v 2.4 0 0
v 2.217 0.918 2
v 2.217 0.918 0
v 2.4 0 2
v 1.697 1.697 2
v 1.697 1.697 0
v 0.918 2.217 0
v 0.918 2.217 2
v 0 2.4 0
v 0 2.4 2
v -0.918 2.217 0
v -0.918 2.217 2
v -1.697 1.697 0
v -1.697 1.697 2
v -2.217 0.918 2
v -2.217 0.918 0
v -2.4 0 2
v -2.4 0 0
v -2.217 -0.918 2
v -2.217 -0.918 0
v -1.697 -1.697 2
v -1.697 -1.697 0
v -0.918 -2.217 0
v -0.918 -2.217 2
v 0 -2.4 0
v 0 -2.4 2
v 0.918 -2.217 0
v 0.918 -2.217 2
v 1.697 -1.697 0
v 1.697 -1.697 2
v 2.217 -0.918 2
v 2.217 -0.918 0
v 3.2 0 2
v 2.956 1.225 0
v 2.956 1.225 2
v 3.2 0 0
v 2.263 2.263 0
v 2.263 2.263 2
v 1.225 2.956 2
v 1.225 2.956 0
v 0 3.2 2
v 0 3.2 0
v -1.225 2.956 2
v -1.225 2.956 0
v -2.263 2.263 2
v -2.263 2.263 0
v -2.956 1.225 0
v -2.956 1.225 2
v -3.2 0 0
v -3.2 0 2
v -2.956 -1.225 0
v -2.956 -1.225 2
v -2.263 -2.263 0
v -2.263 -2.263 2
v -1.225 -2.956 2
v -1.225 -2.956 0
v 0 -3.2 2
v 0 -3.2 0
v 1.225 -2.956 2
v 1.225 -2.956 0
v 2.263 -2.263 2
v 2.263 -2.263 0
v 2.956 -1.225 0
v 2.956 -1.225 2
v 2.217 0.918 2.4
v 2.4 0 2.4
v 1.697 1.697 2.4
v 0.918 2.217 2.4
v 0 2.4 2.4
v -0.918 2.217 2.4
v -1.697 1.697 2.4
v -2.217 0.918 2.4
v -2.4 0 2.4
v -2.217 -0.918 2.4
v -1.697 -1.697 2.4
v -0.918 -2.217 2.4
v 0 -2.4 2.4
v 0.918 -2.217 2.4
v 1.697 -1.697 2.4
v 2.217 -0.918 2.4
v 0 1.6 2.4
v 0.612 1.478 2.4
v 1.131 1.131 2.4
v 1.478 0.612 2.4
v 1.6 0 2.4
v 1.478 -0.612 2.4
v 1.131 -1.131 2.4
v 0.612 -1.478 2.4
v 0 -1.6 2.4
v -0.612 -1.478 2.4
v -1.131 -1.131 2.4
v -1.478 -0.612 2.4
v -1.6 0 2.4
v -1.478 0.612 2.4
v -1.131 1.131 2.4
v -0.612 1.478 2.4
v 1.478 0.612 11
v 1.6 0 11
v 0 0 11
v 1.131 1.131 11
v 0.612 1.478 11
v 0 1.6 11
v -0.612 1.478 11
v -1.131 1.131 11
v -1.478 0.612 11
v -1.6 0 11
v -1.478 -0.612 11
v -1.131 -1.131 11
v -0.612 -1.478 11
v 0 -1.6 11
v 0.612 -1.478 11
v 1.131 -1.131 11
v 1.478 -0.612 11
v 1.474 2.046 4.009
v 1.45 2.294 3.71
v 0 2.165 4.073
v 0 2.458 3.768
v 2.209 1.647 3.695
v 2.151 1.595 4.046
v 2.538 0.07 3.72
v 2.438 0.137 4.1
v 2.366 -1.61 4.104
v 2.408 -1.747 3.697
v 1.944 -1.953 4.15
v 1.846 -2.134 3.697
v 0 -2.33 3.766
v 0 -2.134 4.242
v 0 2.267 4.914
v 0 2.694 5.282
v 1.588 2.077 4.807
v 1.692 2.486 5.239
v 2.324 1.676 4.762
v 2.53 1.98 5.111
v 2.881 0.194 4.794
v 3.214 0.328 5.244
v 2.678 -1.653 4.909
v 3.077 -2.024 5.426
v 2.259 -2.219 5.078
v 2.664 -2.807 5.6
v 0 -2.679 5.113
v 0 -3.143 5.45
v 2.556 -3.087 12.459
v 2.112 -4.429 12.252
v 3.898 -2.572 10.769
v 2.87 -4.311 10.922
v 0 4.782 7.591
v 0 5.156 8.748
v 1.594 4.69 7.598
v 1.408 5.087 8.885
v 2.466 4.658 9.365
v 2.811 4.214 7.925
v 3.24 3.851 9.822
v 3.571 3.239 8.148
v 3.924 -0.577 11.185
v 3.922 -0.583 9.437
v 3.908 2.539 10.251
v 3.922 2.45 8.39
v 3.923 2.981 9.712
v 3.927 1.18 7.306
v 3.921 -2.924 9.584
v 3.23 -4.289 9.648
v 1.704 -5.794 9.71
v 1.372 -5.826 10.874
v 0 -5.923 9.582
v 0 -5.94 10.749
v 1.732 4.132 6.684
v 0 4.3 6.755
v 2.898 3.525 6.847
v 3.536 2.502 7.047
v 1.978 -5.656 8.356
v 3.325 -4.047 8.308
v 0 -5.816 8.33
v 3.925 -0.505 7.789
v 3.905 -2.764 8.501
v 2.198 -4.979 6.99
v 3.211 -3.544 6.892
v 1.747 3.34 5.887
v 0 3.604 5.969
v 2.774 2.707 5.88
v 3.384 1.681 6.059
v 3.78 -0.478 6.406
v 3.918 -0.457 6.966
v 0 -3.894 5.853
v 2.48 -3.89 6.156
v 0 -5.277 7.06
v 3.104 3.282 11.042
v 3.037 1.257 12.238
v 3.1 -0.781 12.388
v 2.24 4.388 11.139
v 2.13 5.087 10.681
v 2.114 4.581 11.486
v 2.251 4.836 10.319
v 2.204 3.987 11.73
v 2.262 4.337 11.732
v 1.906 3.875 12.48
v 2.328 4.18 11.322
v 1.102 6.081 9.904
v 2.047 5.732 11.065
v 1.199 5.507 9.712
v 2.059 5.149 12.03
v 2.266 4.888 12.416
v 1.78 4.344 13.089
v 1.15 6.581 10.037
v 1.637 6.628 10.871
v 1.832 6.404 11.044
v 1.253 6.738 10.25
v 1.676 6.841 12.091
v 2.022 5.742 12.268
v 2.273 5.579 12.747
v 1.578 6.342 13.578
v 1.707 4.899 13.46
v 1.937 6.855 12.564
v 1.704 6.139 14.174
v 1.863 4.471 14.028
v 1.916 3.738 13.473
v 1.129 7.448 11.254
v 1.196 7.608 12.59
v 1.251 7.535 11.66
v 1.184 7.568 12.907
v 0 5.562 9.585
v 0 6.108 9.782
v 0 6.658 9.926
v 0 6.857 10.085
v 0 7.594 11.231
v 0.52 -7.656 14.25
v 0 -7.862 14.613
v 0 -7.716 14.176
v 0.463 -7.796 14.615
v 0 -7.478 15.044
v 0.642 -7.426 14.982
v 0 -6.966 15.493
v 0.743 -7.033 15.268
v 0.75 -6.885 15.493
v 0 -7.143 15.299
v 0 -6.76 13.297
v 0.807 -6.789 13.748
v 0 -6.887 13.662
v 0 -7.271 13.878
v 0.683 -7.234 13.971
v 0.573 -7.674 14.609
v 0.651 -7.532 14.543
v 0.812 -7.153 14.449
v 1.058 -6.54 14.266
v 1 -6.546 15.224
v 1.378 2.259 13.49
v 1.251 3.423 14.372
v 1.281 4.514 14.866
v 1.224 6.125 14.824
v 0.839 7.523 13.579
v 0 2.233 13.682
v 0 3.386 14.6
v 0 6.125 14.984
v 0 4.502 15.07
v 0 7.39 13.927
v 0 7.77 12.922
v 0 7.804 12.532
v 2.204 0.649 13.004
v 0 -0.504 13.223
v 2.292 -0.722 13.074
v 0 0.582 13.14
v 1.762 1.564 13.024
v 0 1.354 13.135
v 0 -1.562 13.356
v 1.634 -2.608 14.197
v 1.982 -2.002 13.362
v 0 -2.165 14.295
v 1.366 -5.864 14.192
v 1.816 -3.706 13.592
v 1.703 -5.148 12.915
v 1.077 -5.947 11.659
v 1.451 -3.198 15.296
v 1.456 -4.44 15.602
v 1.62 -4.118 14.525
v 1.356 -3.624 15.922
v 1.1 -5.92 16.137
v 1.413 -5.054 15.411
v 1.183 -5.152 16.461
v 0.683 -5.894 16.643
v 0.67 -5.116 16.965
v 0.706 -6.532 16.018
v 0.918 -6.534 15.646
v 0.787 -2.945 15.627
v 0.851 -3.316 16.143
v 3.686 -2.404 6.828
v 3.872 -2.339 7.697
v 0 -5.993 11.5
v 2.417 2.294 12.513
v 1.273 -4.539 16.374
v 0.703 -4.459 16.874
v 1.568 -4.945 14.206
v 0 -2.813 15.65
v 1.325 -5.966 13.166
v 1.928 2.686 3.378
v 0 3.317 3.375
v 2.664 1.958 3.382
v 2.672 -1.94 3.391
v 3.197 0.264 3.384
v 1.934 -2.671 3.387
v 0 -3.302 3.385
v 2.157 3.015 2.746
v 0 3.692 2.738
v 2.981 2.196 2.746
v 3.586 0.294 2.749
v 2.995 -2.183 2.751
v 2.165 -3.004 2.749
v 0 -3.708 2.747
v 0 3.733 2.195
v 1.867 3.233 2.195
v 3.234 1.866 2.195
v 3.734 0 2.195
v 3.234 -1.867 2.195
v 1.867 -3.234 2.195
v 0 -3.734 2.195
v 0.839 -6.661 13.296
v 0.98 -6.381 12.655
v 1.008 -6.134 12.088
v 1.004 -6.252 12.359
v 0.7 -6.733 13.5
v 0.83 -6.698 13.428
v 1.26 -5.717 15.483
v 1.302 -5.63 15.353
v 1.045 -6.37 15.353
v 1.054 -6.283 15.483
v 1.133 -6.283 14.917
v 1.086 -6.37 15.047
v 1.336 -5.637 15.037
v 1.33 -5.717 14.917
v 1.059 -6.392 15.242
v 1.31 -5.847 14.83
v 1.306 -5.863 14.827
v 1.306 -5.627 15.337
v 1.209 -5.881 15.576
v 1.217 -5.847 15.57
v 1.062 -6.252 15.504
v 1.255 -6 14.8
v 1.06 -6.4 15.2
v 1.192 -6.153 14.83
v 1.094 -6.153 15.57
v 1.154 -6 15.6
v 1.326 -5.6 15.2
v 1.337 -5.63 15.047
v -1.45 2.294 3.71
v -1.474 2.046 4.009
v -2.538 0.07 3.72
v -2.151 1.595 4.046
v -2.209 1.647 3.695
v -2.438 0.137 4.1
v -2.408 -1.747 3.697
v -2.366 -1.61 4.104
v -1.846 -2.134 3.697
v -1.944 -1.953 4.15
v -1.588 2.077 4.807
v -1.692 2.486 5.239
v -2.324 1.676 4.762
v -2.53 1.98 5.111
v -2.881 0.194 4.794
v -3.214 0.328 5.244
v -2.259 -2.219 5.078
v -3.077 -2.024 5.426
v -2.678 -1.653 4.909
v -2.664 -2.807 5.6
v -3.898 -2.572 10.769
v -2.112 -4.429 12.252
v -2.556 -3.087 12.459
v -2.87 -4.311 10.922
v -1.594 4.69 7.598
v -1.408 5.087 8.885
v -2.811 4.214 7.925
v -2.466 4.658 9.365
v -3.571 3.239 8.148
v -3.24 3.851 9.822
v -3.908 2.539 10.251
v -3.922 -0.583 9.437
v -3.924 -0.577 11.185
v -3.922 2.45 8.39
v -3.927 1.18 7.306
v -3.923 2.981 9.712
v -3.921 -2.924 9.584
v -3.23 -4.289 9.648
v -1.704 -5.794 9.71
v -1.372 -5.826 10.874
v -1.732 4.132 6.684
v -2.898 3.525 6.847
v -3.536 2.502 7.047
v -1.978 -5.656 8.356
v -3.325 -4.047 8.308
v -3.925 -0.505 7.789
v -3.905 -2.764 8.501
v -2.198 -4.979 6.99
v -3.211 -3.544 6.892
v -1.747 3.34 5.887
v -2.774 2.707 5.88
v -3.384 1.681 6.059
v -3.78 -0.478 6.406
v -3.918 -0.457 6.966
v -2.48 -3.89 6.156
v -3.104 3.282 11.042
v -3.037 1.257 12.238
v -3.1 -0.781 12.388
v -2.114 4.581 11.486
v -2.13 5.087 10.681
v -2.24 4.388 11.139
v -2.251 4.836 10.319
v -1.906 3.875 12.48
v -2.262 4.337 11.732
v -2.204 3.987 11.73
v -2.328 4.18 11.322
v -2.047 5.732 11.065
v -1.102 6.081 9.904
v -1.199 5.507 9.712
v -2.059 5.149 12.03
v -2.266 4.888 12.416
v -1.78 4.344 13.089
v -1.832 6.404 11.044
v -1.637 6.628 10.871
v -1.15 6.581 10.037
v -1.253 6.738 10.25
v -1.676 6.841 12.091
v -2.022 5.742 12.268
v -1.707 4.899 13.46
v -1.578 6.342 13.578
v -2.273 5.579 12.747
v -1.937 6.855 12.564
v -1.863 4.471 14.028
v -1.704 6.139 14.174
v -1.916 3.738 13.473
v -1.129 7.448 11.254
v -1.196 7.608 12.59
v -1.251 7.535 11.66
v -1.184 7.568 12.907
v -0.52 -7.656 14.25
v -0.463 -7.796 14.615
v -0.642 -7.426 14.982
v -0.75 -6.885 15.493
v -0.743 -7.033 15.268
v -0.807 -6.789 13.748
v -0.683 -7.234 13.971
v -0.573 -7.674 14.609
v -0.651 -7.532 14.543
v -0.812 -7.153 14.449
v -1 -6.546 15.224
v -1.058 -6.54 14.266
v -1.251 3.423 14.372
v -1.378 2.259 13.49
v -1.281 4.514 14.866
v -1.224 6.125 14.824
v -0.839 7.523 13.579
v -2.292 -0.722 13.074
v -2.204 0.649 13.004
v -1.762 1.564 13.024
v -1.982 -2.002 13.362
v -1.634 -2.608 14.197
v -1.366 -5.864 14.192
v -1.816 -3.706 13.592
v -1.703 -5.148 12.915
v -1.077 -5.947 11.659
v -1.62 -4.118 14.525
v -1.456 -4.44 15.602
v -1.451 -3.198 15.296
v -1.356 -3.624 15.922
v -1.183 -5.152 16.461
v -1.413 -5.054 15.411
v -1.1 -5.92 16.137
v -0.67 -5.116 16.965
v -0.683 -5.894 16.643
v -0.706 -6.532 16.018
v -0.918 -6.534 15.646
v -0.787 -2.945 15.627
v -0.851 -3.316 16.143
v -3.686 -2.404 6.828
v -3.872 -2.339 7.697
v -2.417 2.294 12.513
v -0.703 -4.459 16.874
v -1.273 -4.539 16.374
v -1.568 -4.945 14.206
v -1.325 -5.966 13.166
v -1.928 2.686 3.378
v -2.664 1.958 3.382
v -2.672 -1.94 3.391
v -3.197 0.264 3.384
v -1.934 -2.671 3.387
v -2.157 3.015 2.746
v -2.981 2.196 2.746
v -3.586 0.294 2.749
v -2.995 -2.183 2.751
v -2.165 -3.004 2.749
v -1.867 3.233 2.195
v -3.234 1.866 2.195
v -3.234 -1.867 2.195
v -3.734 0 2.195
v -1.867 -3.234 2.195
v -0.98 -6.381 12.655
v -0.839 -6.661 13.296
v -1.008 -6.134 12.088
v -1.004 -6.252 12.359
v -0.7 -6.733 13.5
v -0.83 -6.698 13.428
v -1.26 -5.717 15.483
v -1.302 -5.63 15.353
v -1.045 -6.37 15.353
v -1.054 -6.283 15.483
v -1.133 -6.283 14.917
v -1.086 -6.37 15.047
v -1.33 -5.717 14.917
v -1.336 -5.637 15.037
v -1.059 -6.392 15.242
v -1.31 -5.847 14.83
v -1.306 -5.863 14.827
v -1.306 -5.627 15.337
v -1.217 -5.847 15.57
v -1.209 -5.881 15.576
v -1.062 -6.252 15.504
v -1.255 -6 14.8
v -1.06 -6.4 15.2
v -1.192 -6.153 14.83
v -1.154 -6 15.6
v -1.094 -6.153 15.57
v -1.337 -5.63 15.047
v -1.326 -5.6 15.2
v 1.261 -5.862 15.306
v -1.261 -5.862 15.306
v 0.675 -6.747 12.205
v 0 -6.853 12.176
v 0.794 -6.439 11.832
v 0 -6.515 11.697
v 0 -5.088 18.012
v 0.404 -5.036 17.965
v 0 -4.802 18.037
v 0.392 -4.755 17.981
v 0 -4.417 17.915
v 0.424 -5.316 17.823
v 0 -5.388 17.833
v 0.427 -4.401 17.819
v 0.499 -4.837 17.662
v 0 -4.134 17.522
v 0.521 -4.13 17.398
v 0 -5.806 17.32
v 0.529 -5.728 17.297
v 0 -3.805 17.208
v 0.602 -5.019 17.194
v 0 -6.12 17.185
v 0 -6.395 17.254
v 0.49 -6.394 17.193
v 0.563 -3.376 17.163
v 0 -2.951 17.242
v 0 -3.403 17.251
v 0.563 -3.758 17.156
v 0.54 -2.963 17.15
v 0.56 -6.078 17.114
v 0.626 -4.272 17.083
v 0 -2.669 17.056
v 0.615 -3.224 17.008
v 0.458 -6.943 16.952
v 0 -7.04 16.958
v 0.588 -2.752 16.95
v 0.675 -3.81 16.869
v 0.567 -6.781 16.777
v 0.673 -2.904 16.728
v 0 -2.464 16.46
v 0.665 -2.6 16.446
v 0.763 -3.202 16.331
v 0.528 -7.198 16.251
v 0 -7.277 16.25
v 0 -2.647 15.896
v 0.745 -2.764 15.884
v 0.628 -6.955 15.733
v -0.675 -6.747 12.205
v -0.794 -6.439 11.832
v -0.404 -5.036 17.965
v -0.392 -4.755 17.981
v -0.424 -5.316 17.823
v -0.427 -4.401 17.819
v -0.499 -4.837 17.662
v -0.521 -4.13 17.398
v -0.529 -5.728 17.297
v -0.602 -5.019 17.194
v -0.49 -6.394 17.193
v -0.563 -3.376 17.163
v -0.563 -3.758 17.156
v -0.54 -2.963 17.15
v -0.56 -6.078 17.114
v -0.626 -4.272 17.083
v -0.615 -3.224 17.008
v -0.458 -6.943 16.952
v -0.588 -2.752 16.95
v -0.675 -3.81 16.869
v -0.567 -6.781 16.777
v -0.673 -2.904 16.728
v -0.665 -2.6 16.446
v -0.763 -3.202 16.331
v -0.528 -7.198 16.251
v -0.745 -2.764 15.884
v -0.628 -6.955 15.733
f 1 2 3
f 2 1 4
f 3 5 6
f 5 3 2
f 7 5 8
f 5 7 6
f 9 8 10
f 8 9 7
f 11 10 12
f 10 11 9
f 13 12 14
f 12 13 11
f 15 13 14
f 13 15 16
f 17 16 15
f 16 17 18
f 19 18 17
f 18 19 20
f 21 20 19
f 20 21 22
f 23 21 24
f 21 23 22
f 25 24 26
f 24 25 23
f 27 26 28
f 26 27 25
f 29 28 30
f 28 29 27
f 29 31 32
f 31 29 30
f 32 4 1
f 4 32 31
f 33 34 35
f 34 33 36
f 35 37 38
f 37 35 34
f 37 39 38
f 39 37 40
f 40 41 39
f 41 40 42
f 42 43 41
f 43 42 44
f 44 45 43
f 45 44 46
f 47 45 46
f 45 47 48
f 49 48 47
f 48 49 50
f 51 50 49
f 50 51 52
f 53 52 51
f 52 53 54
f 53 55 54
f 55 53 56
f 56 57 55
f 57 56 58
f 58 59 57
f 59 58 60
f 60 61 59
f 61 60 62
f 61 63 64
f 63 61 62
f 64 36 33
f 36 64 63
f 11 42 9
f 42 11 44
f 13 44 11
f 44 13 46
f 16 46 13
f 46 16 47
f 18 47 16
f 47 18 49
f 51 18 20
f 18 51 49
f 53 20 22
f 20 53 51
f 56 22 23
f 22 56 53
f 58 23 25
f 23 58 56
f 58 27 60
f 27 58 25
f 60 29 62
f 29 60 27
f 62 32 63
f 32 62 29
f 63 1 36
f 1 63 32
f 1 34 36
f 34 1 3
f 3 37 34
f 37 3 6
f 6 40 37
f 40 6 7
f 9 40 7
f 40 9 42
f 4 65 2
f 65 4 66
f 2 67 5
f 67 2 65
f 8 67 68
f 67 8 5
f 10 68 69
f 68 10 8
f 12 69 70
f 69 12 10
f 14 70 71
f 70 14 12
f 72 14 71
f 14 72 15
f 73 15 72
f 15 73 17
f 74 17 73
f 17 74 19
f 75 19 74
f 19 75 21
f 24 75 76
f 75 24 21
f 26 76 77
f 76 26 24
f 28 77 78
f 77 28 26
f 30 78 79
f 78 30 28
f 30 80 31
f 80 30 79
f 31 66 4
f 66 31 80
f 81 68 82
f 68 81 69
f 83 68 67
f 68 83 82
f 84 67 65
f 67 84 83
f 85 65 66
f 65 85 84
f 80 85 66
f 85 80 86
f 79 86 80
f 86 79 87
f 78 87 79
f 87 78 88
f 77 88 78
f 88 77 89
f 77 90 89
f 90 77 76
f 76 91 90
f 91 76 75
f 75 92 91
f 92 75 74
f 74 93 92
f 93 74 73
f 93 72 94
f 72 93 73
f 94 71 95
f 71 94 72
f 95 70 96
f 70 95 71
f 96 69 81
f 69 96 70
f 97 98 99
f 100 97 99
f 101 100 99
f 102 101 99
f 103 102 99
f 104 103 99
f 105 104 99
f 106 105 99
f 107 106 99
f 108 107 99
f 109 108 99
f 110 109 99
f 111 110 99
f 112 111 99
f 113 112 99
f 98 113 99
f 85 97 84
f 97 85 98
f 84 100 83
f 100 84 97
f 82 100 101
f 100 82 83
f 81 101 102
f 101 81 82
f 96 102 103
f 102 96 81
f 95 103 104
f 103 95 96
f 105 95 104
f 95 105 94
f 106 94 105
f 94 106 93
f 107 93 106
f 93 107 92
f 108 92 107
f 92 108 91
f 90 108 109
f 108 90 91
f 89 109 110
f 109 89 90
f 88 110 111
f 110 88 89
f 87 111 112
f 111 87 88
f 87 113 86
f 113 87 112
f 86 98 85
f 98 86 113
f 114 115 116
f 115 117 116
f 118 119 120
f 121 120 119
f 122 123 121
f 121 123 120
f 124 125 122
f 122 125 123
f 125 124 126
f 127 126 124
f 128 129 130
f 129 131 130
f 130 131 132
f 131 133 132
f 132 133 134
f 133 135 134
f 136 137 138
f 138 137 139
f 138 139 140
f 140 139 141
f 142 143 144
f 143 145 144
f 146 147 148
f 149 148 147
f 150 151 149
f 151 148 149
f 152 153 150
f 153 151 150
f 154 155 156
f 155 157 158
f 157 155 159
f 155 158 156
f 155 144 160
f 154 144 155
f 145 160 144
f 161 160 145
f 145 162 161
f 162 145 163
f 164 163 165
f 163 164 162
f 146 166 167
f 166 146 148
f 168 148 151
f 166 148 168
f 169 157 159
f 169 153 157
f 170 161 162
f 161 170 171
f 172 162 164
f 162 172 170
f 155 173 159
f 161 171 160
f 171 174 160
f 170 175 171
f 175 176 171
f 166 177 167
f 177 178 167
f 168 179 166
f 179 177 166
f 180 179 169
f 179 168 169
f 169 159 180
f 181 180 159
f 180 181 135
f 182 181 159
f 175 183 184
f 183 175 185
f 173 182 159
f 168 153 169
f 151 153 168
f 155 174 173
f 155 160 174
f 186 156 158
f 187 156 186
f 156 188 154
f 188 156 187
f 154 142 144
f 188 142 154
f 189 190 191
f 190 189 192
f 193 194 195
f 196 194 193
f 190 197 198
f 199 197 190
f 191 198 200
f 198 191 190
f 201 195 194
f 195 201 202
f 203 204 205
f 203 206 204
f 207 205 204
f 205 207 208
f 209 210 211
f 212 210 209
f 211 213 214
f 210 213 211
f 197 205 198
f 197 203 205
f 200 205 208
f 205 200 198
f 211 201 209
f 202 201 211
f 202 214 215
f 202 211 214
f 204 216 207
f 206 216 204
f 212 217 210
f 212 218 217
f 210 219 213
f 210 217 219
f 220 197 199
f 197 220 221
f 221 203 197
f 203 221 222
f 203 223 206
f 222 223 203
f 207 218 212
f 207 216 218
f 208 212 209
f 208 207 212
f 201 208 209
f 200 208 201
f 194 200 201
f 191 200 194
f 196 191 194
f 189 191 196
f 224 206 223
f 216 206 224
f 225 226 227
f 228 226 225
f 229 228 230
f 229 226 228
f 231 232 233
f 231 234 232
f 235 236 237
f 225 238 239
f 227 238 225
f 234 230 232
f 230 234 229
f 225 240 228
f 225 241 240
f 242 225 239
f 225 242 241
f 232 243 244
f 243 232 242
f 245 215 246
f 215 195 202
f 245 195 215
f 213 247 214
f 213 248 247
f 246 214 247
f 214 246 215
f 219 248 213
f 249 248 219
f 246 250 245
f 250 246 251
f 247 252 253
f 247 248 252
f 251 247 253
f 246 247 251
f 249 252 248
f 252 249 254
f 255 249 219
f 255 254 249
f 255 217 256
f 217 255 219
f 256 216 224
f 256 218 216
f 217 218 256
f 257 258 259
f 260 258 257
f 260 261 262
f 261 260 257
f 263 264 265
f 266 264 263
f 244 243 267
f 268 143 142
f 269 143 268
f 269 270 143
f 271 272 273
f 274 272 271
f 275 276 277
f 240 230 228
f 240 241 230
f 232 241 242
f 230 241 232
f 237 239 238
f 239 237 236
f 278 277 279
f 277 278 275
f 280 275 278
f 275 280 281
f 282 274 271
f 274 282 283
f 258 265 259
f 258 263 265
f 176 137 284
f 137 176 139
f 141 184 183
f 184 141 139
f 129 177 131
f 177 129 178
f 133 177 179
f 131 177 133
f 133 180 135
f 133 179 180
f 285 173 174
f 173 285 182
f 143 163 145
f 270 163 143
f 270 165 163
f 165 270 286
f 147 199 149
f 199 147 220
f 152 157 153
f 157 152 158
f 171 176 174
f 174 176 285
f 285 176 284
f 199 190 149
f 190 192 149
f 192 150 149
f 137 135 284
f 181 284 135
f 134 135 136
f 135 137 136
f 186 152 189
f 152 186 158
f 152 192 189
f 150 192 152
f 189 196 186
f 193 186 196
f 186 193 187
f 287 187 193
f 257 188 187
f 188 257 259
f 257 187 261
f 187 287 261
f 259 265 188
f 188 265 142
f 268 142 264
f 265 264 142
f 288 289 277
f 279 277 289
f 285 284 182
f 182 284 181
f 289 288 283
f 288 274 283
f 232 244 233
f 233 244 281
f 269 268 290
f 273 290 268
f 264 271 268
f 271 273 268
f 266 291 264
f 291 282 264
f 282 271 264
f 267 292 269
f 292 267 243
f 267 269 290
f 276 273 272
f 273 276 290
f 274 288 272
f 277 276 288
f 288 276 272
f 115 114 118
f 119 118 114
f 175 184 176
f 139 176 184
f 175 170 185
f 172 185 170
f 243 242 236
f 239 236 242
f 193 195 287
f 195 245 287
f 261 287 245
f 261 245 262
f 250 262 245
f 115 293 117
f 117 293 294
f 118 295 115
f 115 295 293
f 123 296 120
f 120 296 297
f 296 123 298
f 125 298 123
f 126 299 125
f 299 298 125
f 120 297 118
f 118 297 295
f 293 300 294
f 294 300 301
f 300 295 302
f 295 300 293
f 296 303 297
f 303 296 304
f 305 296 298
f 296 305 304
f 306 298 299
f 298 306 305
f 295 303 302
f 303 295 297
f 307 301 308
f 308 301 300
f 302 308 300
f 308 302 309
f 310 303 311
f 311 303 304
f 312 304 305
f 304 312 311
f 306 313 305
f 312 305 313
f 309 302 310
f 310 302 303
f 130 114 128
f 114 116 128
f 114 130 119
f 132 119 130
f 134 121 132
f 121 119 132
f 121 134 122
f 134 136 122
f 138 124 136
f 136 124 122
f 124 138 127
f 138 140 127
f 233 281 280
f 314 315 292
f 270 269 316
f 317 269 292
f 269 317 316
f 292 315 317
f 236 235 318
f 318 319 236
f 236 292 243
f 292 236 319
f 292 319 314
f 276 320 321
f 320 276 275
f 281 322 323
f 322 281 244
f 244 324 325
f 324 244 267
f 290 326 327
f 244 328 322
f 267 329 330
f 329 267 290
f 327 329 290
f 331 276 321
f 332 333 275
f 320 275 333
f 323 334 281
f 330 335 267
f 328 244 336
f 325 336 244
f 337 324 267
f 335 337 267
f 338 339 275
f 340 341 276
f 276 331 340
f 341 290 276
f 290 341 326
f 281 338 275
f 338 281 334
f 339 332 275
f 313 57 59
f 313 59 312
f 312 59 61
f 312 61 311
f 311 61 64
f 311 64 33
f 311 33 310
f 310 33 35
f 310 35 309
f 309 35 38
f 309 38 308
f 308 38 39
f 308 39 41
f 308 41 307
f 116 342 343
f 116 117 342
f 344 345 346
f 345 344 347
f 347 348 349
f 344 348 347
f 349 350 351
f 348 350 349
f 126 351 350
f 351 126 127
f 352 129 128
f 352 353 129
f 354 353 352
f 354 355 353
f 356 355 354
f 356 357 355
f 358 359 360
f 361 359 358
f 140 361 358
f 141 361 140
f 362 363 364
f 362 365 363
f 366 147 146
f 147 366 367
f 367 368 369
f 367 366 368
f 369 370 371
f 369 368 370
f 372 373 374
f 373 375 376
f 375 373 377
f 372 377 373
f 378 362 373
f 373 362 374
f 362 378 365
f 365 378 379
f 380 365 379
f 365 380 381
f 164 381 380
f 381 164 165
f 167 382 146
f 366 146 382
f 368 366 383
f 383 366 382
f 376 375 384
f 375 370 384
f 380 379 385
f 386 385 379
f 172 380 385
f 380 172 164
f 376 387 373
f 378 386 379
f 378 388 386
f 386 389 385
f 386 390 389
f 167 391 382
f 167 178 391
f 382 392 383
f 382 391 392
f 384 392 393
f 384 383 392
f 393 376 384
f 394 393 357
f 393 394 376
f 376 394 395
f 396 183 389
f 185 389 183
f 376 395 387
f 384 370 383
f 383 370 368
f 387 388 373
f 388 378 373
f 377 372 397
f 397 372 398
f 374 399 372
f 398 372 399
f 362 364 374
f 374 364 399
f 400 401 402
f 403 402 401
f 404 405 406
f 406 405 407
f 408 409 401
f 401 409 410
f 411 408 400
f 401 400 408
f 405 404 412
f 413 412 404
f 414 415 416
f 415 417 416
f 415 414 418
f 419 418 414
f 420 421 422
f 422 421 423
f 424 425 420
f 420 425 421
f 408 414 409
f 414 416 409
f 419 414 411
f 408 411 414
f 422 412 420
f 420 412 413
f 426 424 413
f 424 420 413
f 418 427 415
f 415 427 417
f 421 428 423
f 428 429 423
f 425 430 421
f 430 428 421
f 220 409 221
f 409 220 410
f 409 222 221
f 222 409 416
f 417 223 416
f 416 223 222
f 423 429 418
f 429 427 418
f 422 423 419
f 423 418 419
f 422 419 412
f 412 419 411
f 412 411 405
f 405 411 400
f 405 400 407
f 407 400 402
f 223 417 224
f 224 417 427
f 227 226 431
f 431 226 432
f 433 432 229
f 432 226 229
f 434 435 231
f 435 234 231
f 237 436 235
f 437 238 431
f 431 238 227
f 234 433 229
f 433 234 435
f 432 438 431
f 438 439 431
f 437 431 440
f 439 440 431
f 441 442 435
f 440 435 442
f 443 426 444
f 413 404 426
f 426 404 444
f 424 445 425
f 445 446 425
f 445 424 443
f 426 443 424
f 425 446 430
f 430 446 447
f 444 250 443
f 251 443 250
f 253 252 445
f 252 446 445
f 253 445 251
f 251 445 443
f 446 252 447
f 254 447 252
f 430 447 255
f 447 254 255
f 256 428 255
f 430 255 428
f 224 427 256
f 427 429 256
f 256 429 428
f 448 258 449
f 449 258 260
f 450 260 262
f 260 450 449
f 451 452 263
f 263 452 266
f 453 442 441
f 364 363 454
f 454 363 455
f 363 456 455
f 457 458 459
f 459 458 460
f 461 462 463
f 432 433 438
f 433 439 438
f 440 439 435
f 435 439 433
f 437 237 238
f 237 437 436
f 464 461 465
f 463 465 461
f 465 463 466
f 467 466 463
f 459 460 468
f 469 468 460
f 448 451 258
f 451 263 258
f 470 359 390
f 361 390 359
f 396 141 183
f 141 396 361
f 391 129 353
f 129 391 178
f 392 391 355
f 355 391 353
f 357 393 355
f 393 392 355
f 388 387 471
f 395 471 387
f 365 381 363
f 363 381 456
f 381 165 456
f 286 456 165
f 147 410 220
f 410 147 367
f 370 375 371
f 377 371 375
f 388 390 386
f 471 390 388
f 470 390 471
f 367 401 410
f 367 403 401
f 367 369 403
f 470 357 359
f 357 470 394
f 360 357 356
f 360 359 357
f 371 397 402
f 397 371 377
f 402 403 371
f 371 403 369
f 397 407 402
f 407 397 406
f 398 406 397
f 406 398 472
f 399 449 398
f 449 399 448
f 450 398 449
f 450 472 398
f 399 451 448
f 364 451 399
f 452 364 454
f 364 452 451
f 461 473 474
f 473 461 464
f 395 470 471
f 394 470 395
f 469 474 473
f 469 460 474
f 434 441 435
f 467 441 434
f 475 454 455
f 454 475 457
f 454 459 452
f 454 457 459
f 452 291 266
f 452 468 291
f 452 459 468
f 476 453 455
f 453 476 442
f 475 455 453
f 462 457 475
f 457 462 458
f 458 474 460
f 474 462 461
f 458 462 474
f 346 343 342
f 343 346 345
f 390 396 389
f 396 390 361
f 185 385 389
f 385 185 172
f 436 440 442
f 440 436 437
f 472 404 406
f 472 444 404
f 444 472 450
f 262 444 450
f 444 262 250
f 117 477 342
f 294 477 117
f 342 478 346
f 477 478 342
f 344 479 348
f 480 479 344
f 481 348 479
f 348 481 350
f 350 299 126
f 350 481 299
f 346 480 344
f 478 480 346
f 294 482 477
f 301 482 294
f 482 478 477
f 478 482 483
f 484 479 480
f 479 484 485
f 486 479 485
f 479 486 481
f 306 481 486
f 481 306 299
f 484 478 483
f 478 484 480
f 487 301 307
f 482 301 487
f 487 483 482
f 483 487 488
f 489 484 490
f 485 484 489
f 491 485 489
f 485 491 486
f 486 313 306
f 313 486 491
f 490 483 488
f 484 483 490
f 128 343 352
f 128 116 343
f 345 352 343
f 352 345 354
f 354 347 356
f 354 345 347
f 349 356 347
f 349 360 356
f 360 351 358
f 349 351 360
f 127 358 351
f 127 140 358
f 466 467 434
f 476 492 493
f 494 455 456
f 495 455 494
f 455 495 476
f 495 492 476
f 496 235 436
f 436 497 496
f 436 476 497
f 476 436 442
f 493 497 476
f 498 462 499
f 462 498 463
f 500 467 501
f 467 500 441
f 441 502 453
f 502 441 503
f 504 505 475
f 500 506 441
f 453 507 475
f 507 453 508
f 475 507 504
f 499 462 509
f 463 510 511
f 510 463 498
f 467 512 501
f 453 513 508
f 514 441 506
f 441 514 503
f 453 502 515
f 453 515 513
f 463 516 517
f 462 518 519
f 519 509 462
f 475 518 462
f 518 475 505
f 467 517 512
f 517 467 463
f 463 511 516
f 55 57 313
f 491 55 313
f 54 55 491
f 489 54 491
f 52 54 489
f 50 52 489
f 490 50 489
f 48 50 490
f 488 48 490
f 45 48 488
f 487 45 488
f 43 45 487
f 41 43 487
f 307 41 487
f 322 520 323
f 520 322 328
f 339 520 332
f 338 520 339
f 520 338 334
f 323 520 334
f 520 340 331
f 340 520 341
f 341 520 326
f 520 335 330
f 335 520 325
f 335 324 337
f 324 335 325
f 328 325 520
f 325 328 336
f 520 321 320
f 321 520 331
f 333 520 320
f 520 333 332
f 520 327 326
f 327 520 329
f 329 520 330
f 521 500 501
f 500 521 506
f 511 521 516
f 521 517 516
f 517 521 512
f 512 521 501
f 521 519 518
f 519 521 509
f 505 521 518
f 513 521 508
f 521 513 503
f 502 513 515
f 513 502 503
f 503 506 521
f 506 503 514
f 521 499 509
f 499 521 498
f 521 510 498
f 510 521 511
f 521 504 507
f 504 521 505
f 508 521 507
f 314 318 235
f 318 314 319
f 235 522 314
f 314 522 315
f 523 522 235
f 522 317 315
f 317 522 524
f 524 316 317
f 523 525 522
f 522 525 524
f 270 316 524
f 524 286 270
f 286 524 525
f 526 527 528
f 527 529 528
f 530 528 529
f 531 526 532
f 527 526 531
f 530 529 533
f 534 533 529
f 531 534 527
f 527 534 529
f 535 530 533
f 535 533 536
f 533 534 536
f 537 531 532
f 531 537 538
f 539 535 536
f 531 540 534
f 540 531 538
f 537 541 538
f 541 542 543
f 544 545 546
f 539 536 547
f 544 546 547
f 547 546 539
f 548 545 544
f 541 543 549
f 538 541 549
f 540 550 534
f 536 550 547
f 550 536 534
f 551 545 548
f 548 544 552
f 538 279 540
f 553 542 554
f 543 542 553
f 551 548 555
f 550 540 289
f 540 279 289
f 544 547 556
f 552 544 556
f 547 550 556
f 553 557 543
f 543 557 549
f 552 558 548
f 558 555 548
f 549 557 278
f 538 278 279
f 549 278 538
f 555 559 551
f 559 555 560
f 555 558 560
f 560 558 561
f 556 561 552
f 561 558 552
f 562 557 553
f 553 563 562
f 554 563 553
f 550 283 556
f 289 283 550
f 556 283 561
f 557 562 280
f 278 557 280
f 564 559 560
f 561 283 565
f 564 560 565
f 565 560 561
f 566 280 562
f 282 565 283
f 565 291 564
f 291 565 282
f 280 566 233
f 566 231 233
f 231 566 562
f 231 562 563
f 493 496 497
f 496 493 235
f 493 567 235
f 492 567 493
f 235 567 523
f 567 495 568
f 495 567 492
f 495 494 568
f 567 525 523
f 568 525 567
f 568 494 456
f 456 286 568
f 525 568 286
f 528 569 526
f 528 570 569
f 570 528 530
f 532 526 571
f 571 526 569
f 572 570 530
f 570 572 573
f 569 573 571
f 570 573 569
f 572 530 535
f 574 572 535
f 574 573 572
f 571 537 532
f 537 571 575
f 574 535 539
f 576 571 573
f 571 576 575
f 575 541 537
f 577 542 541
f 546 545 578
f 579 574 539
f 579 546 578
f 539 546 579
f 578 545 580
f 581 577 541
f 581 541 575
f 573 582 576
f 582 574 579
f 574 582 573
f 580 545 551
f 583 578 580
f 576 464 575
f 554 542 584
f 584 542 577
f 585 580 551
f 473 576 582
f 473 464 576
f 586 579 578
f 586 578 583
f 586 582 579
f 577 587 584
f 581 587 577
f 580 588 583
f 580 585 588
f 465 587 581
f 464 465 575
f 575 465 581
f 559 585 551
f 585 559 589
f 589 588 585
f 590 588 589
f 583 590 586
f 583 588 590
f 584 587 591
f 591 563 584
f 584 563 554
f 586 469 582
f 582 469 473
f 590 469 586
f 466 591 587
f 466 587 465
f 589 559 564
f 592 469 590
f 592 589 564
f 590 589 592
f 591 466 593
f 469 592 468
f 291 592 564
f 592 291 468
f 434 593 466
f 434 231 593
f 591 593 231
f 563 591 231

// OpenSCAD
use <../lib.scad>
use <../p/4-4cylc.scad>
use <../p/4-4cyli.scad>
use <../p/4-4edge.scad>
use <../p/4-4ring2.scad>
use <s/95342s01.scad>
use <s/95342s02.scad>
use <s/95342s03.scad>
use <../p/stud4a.scad>
function ldraw_lib__95342() = [
// 0 Animal Chicken
// 0 Name: 95342.dat
// 0 Author: Magnus Forsberg [MagFors]
// 0 !LDRAW_ORG Part UPDATE 2011-02
// 0 !LICENSE Licensed under CC BY 4.0 : see CAreadme.txt
// 
// 0 BFC CERTIFY CCW
  [0,"BFC","CERTIFY"],
  [0,"BFC","CCW"],
// 
// 0 !HISTORY 2011-09-08 {LEGO Digital Designer} Original part shape
// 0 !HISTORY 2011-09-10 [MagFors] File preparation for LDraw Parts Tracker
// 0 !HISTORY 2011-12-29 [PTadmin] Official Update 2011-02
// 
// 
// 1 16 0 -5 0 1 0 0 0 -1.25 0 0 0 1 stud4a.dat
  [1,16,0,-5,0,1,0,0,0,-1.25,0,0,0,1, ldraw_lib__stud4a()],
// 1 16 0 -6 0 6 0 0 0 1 0 0 0 6 4-4edge.dat
  [1,16,0,-6,0,6,0,0,0,1,0,0,0,6, ldraw_lib__4_4edge()],
// 0 BFC INVERTNEXT
  [0,"BFC","INVERTNEXT"],
// 1 16 0 -6 0 6 0 0 0 1 0 0 0 6 4-4cyli.dat
  [1,16,0,-6,0,6,0,0,0,1,0,0,0,6, ldraw_lib__4_4cyli()],
// 1 16 0 -6 0 -2 0 0 0 -1 0 0 0 2 4-4ring2.dat
  [1,16,0,-6,0,-2,0,0,0,-1,0,0,0,2, ldraw_lib__4_4ring2()],
// 0 BFC INVERTNEXT
  [0,"BFC","INVERTNEXT"],
// 1 16 0 -27.5 0 4 0 0 0 21.5 0 0 0 4 4-4cylc.dat
  [1,16,0,-27.5,0,4,0,0,0,21.5,0,0,0,4, ldraw_lib__4_4cylc()],
// 1 16 0 -5 0 8 0 0 0 1 0 0 0 8 4-4edge.dat
  [1,16,0,-5,0,8,0,0,0,1,0,0,0,8, ldraw_lib__4_4edge()],
// 1 16 0 0 0 1 0 0 0 1 0 0 0 1 s\95342s01.dat
  [1,16,0,0,0,1,0,0,0,1,0,0,0,1, ldraw_lib__s__95342s01()],
// 1 16 0 0 0 -1 0 0 0 1 0 0 0 1 s\95342s01.dat
  [1,16,0,0,0,-1,0,0,0,1,0,0,0,1, ldraw_lib__s__95342s01()],
// 1 16 0 0 0 1 0 0 0 1 0 0 0 1 s\95342s02.dat
  [1,16,0,0,0,1,0,0,0,1,0,0,0,1, ldraw_lib__s__95342s02()],
// 1 16 0 0 0 -1 0 0 0 1 0 0 0 1 s\95342s02.dat
  [1,16,0,0,0,-1,0,0,0,1,0,0,0,1, ldraw_lib__s__95342s02()],
// 1 16 0 0 0 1 0 0 0 1 0 0 0 1 s\95342s03.dat
  [1,16,0,0,0,1,0,0,0,1,0,0,0,1, ldraw_lib__s__95342s03()],
// 1 16 0 0 0 -1 0 0 0 1 0 0 0 1 s\95342s03.dat
  [1,16,0,0,0,-1,0,0,0,1,0,0,0,1, ldraw_lib__s__95342s03()],
// 0 //
// 5 24 0 -9.42 6.146 0 -10.183 5.412 3.624 -9.275 5.736 -3.624 -9.275 5.736
  [5,24,0,-9.42,6.146,0,-10.183,5.412,3.624,-9.275,5.736,-3.624,-9.275,5.736],
// 5 24 0 -10.606 -5.336 0 -9.415 -5.824 4.859 -10.375 -4.882 -4.859 -10.375 -4.882
  [5,24,0,-10.606,-5.336,0,-9.415,-5.824,4.859,-10.375,-4.882,-4.859,-10.375,-4.882],
// 5 24 0 -12.284 5.667 0 -13.206 6.734 3.97 -12.018 5.193 -3.97 -12.018 5.193
  [5,24,0,-12.284,5.667,0,-13.206,6.734,3.97,-12.018,5.193,-3.97,-12.018,5.193],
// 5 24 0 -13.625 -7.857 0 -12.783 -6.698 6.66 -13.999 -7.017 -6.66 -13.999 -7.017
  [5,24,0,-13.625,-7.857,0,-12.783,-6.698,6.66,-13.999,-7.017,-6.66,-13.999,-7.017],
// 5 24 0 -18.978 11.956 0 -21.87 12.891 3.984 -18.996 11.726 -3.984 -18.996 11.726
  [5,24,0,-18.978,11.956,0,-21.87,12.891,3.984,-18.996,11.726,-3.984,-18.996,11.726],
// 5 24 0 -26.873 -14.851 0 -23.955 -14.807 4.261 -24.274 -14.486 -3.429 -27.184 -14.566
  [5,24,0,-26.873,-14.851,0,-23.955,-14.807,4.261,-24.274,-14.486,-3.429,-27.184,-14.566],
// 5 24 0 -16.887 10.749 0 -18.978 11.956 4.331 -16.71 10.331 -4.331 -16.71 10.331
  [5,24,0,-16.887,10.749,0,-18.978,11.956,4.331,-16.71,10.331,-4.331,-16.71,10.331],
// 5 24 0 -23.955 -14.807 0 -20.826 -14.539 4.945 -20.889 -14.141 -4.261 -24.274 -14.486
  [5,24,0,-23.955,-14.807,0,-20.826,-14.539,4.945,-20.889,-14.141,-4.261,-24.274,-14.486],
// 5 24 0 -14.922 9.011 0 -16.887 10.749 4.367 -14.717 8.349 -4.367 -14.717 8.349
  [5,24,0,-14.922,9.011,0,-16.887,10.749,4.367,-14.717,8.349,-4.367,-14.717,8.349],
// 5 24 0 -17.651 -13.193 0 -14.633 -9.734 5.495 -17.475 -12.448 -5.495 -17.475 -12.448
  [5,24,0,-17.651,-13.193,0,-14.633,-9.734,5.495,-17.475,-12.448,-5.495,-17.475,-12.448],
// 5 24 0 -23.962 13.906 0 -24.455 15.271 2.755 -24.76 15.203 -2.998 -24.28 13.767
  [5,24,0,-23.962,13.906,0,-24.455,15.271,2.755,-24.76,15.203,-2.998,-24.28,13.767],
// 5 24 0 -24.455 15.271 0 -24.814 16.644 2.876 -25.092 16.452 -2.876 -25.092 16.452
  [5,24,0,-24.455,15.271,0,-24.814,16.644,2.876,-25.092,16.452,-2.876,-25.092,16.452],
// 5 24 0 -24.814 16.644 0 -25.213 17.143 2.876 -25.092 16.452 -2.876 -25.092 16.452
  [5,24,0,-24.814,16.644,0,-25.213,17.143,2.876,-25.092,16.452,-2.876,-25.092,16.452],
// 5 24 0 -25.213 17.143 0 -28.078 18.984 3.132 -25.624 16.845 -3.132 -25.624 16.845
  [5,24,0,-25.213,17.143,0,-28.078,18.984,3.132,-25.624,16.845,-3.132,-25.624,16.845],
// 5 24 0 -29.243 -16.287 0 -28.75 -14.982 1.984 -29.579 -16.097 -1.984 -29.579 -16.097
  [5,24,0,-29.243,-16.287,0,-28.75,-14.982,1.984,-29.579,-16.097,-1.984,-29.579,-16.097],
// 5 24 0 -36.533 -19.655 0 -35.441 -19.289 1.301 -35.626 -19.141 -1.301 -35.626 -19.141
  [5,24,0,-36.533,-19.655,0,-35.441,-19.289,1.301,-35.626,-19.141,-1.301,-35.626,-19.141],
// 5 24 0 -37.609 -18.695 0 -36.533 -19.655 1.157 -36.538 -19.49 -1.157 -36.538 -19.49
  [5,24,0,-37.609,-18.695,0,-36.533,-19.655,1.157,-36.538,-19.49,-1.157,-36.538,-19.49],
// 5 24 0 -38.732 -17.415 0 -38.247 -17.858 1.857 -38.171 -17.583 -1.857 -38.171 -17.583
  [5,24,0,-38.732,-17.415,0,-38.247,-17.858,1.857,-38.171,-17.583,-1.857,-38.171,-17.583],
// 5 24 0 -40.626 -18.193 0 -38.732 -17.415 1.321 -40.628 -17.996 -1.321 -40.628 -17.996
  [5,24,0,-40.626,-18.193,0,-38.732,-17.415,1.321,-40.628,-17.996,-1.321,-40.628,-17.996],
// 5 24 0 -42.395 -17.6 0 -40.626 -18.193 1.145 -42.379 -17.357 -1.145 -42.379 -17.357
  [5,24,0,-42.395,-17.6,0,-40.626,-18.193,1.145,-42.379,-17.357,-1.145,-42.379,-17.357],
// 5 24 0 -43.135 -15.988 0 -42.395 -17.6 1.145 -42.379 -17.357 -1.145 -42.379 -17.357
  [5,24,0,-43.135,-15.988,0,-42.395,-17.6,1.145,-42.379,-17.357,-1.145,-42.379,-17.357],
// 5 24 0 -42.963 -15.299 0 -43.135 -15.988 1.224 -42.983 -15.985 -1.224 -42.983 -15.985
  [5,24,0,-42.963,-15.299,0,-43.135,-15.988,1.224,-42.983,-15.985,-1.224,-42.983,-15.985],
// 5 24 0 -45.03 -12.72 0 -44.583 -13.47 1.059 -44.557 -13.289 -1.059 -44.557 -13.289
  [5,24,0,-45.03,-12.72,0,-44.583,-13.47,1.059,-44.557,-13.289,-1.059,-44.557,-13.289],
// 5 24 0 -44.787 -11.042 0 -45.092 -12.005 0.98 -44.952 -11.888 -0.98 -44.952 -11.888
  [5,24,0,-44.787,-11.042,0,-45.092,-12.005,0.98,-44.952,-11.888,-0.98,-44.952,-11.888],
// 5 24 0 -41.149 -6.16 0 -42.64 -6.673 1.469 -42.375 -6.88 -1.662 -41.115 -6.5
  [5,24,0,-41.149,-6.16,0,-42.64,-6.673,1.469,-42.375,-6.88,-1.662,-41.115,-6.5],
// 5 24 0 -39.739 -6.618 0 -41.149 -6.16 1.662 -41.115 -6.5 -1.662 -41.115 -6.5
  [5,24,0,-39.739,-6.618,0,-41.149,-6.16,1.662,-41.115,-6.5,-1.662,-41.115,-6.5],
// 5 24 0 -30.44 -17.132 0 -29.243 -16.287 1.687 -30.512 -16.868 -1.687 -30.512 -16.868
  [5,24,0,-30.44,-17.132,0,-29.243,-16.287,1.687,-30.512,-16.868,-1.687,-30.512,-16.868],
// 5 24 0 -33.243 -16.899 0 -30.44 -17.132 1.687 -30.512 -16.868 -1.687 -30.512 -16.868
  [5,24,0,-33.243,-16.899,0,-30.44,-17.132,1.687,-30.512,-16.868,-1.687,-30.512,-16.868],
// 5 24 0 -34.154 -17.217 0 -33.243 -16.899 2.017 -34.369 -16.972 -2.017 -34.369 -16.972
  [5,24,0,-34.154,-17.217,0,-33.243,-16.899,2.017,-34.369,-16.972,-2.017,-34.369,-16.972],
// 5 24 0 -35.441 -19.289 0 -34.694 -18.177 1.301 -35.626 -19.141 -1.301 -35.626 -19.141
  [5,24,0,-35.441,-19.289,0,-34.694,-18.177,1.301,-35.626,-19.141,-1.301,-35.626,-19.141],
// 5 24 0 -38.247 -17.858 0 -37.609 -18.695 1.606 -37.455 -18.566 -1.857 -38.171 -17.583
  [5,24,0,-38.247,-17.858,0,-37.609,-18.695,1.606,-37.455,-18.566,-1.857,-38.171,-17.583],
// 5 24 0 -43.299 -14.515 0 -42.963 -15.299 1.322 -43.242 -14.32 -1.322 -43.242 -14.32
  [5,24,0,-43.299,-14.515,0,-42.963,-15.299,1.322,-43.242,-14.32,-1.322,-43.242,-14.32],
// 5 24 0 -44.583 -13.47 0 -43.299 -14.515 1.322 -43.242 -14.32 -1.059 -44.557 -13.289
  [5,24,0,-44.583,-13.47,0,-43.299,-14.515,1.322,-43.242,-14.32,-1.059,-44.557,-13.289],
// 5 24 0 -43.805 -10.336 0 -44.787 -11.042 1.068 -44.547 -11.002 -1.068 -44.547 -11.002
  [5,24,0,-43.805,-10.336,0,-44.787,-11.042,1.068,-44.547,-11.002,-1.068,-44.547,-11.002],
// 5 24 0 -43.105 -7.378 0 -43.128 -8.507 1.408 -42.907 -8.439 -1.408 -42.907 -8.439
  [5,24,0,-43.105,-7.378,0,-43.128,-8.507,1.408,-42.907,-8.439,-1.408,-42.907,-8.439],
// 5 24 0 -39.126 -7.033 0 -39.739 -6.618 1.863 -39.709 -6.909 -1.967 -39.067 -7.362
  [5,24,0,-39.126,-7.033,0,-39.739,-6.618,1.863,-39.709,-6.909,-1.967,-39.067,-7.362],
// 5 24 0 -42.64 -6.673 0 -43.105 -7.378 1.351 -42.876 -7.408 -1.351 -42.876 -7.408
  [5,24,0,-42.64,-6.673,0,-43.105,-7.378,1.351,-42.876,-7.408,-1.351,-42.876,-7.408],
// 5 24 0 -43.021 -9.513 0 -43.805 -10.336 1.302 -43.495 -10.324 -1.302 -43.495 -10.324
  [5,24,0,-43.021,-9.513,0,-43.805,-10.336,1.302,-43.495,-10.324,-1.302,-43.495,-10.324],
// 5 24 0 -36.499 8.465 0 -34.204 5.583 3.128 -35.931 8.557 -3.128 -35.931 8.557
  [5,24,0,-36.499,8.465,0,-34.204,5.583,3.128,-35.931,8.557,-3.128,-35.931,8.557],
// 5 24 0 -37.46 15.312 0 -37.676 11.254 3.202 -37.165 11.285 -3.202 -37.165 11.285
  [5,24,0,-37.46,15.312,0,-37.676,11.254,3.202,-37.165,11.285,-3.202,-37.165,11.285],
// 5 24 0 -37.676 11.254 0 -36.499 8.465 3.202 -37.165 11.285 -3.202 -37.165 11.285
  [5,24,0,-37.676,11.254,0,-36.499,8.465,3.202,-37.165,11.285,-3.202,-37.165,11.285],
// 5 24 0 -34.817 18.476 0 -37.46 15.312 2.097 -33.947 18.808 -2.097 -33.947 18.808
  [5,24,0,-34.817,18.476,0,-37.46,15.312,2.097,-33.947,18.808,-2.097,-33.947,18.808],
// 5 24 0 -32.306 19.426 0 -34.817 18.476 2.097 -33.947 18.808 -2.097 -33.947 18.808
  [5,24,0,-32.306,19.426,0,-34.817,18.476,2.097,-33.947,18.808,-2.097,-33.947,18.808],
// 5 24 0 -31.33 19.51 0 -32.306 19.426 2.991 -31.474 19.021 -2.991 -31.474 19.021
  [5,24,0,-31.33,19.51,0,-32.306,19.426,2.991,-31.474,19.021,-2.991,-31.474,19.021],
// 5 24 0 -28.078 18.984 0 -31.33 19.51 2.822 -28.136 18.619 -2.822 -28.136 18.619
  [5,24,0,-28.078,18.984,0,-31.33,19.51,2.822,-28.136,18.619,-2.822,-28.136,18.619],
// 5 24 0 -32.85 1.456 0 -33.057 -1.261 5.511 -32.51 1.622 -5.511 -32.51 1.622
  [5,24,0,-32.85,1.456,0,-33.057,-1.261,5.511,-32.51,1.622,-5.511,-32.51,1.622],
// 5 24 0 -32.838 3.384 0 -32.85 1.456 5.511 -32.51 1.622 -4.405 -32.559 3.909
  [5,24,0,-32.838,3.384,0,-32.85,1.456,5.511,-32.51,1.622,-4.405,-32.559,3.909],
// 5 24 0 -33.389 -3.905 0 -35.737 -5.413 4.084 -35.492 -6.519 -4.084 -35.492 -6.519
  [5,24,0,-33.389,-3.905,0,-35.737,-5.413,4.084,-35.492,-6.519,-4.084,-35.492,-6.519],
// 5 24 0 -34.694 -18.177 0 -34.154 -17.217 2.017 -34.369 -16.972 -1.707 -34.928 -18.085
  [5,24,0,-34.694,-18.177,0,-34.154,-17.217,2.017,-34.369,-16.972,-1.707,-34.928,-18.085],
// 5 24 0 -33.057 -1.261 0 -33.389 -3.905 4.954 -33.404 -5.006 -4.954 -33.404 -5.006
  [5,24,0,-33.057,-1.261,0,-33.389,-3.905,4.954,-33.404,-5.006,-4.954,-33.404,-5.006],
// 5 24 0 -14.633 -9.734 0 -13.625 -7.857 6.66 -13.999 -7.017 -6.201 -15.391 -9.725
  [5,24,0,-14.633,-9.734,0,-13.625,-7.857,6.66,-13.999,-7.017,-6.201,-15.391,-9.725],
// 5 24 0 -13.206 6.734 0 -14.922 9.011 4.367 -14.717 8.349 -4.367 -14.717 8.349
  [5,24,0,-13.206,6.734,0,-14.922,9.011,4.367,-14.717,8.349,-4.367,-14.717,8.349],
// 5 24 0 -43.128 -8.507 0 -43.021 -9.513 1.408 -42.891 -9.396 -1.408 -42.891 -9.396
  [5,24,0,-43.128,-8.507,0,-43.021,-9.513,1.408,-42.891,-9.396,-1.408,-42.891,-9.396],
// 5 24 0 -28.75 -14.982 0 -26.873 -14.851 2.693 -29.147 -14.868 -2.693 -29.147 -14.868
  [5,24,0,-28.75,-14.982,0,-26.873,-14.851,2.693,-29.147,-14.868,-2.693,-29.147,-14.868],
// 5 24 0 -21.87 12.891 0 -23.962 13.906 2.998 -24.28 13.767 -3.521 -22.212 12.717
  [5,24,0,-21.87,12.891,0,-23.962,13.906,2.998,-24.28,13.767,-3.521,-22.212,12.717],
// 5 24 0 -35.737 -5.413 0 -39.126 -7.033 4.084 -35.492 -6.519 -4.084 -35.492 -6.519
  [5,24,0,-35.737,-5.413,0,-39.126,-7.033,4.084,-35.492,-6.519,-4.084,-35.492,-6.519],
// 5 24 0 -20.826 -14.539 0 -17.651 -13.193 4.945 -20.889 -14.141 -4.945 -20.889 -14.141
  [5,24,0,-20.826,-14.539,0,-17.651,-13.193,4.945,-20.889,-14.141,-4.945,-20.889,-14.141],
// 5 24 0 -45.092 -12.005 0 -45.03 -12.72 1.01 -44.913 -12.591 -1.01 -44.913 -12.591
  [5,24,0,-45.092,-12.005,0,-45.03,-12.72,1.01,-44.913,-12.591,-1.01,-44.913,-12.591],
// 5 24 0 -34.204 5.583 0 -32.838 3.384 3.445 -33.725 5.647 -3.445 -33.725 5.647
  [5,24,0,-34.204,5.583,0,-32.838,3.384,3.445,-33.725,5.647,-3.445,-33.725,5.647],
// 5 24 0 -8.438 8.293 0 -9.42 6.146 4.821 -8.445 6.716 -4.821 -8.445 6.716
  [5,24,0,-8.438,8.293,0,-9.42,6.146,4.821,-8.445,6.716,-4.821,-8.445,6.716],
// 5 24 0 -9.415 -5.824 0 -8.462 -8.255 4.615 -9.243 -5.336 -4.615 -9.243 -5.336
  [5,24,0,-9.415,-5.824,0,-8.462,-8.255,4.615,-9.243,-5.336,-4.615,-9.243,-5.336],
// 5 24 0 -6.846 9.231 0 -8.438 8.293 5.393 -6.864 7.538 -5.393 -6.864 7.538
  [5,24,0,-6.846,9.231,0,-8.438,8.293,5.393,-6.864,7.538,-5.393,-6.864,7.538],
// 5 24 0 -8.462 -8.255 0 -6.868 -9.269 5.413 -6.873 -7.511 -4.836 -8.468 -6.677
  [5,24,0,-8.462,-8.255,0,-6.868,-9.269,5.413,-6.873,-7.511,-4.836,-8.468,-6.677],
// 5 24 0 -5.488 9.333 0 -6.846 9.231 4.667 -5.488 8.083 -4.667 -5.488 8.083
  [5,24,0,-5.488,9.333,0,-6.846,9.231,4.667,-5.488,8.083,-4.667,-5.488,8.083],
// 5 24 0 -6.868 -9.269 0 -5.488 -9.334 5.413 -6.873 -7.511 -5.413 -6.873 -7.511
  [5,24,0,-6.868,-9.269,0,-5.488,-9.334,5.413,-6.873,-7.511,-5.413,-6.873,-7.511],
// 5 24 0 -10.183 5.412 0 -12.284 5.667 3.685 -10.022 5.114 -3.685 -10.022 5.114
  [5,24,0,-10.183,5.412,0,-12.284,5.667,3.685,-10.022,5.114,-3.685,-10.022,5.114],
// 5 24 0 -12.783 -6.698 0 -10.606 -5.336 5.648 -12.695 -5.548 -5.648 -12.695 -5.548
  [5,24,0,-12.783,-6.698,0,-10.606,-5.336,5.648,-12.695,-5.548,-5.648,-12.695,-5.548],
// 5 24 0 -5.488 -9.334 0 -5 -8 3.062 -5 -7.391 -3.062 -5 -7.391
  [5,24,0,-5.488,-9.334,0,-5,-8,3.062,-5,-7.391,-3.062,-5,-7.391],
// 5 24 0 -5 8 0 -5.488 9.333 4.667 -5.488 8.083 -4.667 -5.488 8.083
  [5,24,0,-5,8,0,-5.488,9.333,4.667,-5.488,8.083,-4.667,-5.488,8.083],
];
module ldraw_lib__95342(step=0, col=false, unit=2/5, alt=false, line=0.2, solid=!$preview)
    makepoly(ldraw_lib__95342(), step=step, col=col, unit=unit, alt=alt, line=line, solid=solid);
ldraw_lib__95342(line=0.2);
